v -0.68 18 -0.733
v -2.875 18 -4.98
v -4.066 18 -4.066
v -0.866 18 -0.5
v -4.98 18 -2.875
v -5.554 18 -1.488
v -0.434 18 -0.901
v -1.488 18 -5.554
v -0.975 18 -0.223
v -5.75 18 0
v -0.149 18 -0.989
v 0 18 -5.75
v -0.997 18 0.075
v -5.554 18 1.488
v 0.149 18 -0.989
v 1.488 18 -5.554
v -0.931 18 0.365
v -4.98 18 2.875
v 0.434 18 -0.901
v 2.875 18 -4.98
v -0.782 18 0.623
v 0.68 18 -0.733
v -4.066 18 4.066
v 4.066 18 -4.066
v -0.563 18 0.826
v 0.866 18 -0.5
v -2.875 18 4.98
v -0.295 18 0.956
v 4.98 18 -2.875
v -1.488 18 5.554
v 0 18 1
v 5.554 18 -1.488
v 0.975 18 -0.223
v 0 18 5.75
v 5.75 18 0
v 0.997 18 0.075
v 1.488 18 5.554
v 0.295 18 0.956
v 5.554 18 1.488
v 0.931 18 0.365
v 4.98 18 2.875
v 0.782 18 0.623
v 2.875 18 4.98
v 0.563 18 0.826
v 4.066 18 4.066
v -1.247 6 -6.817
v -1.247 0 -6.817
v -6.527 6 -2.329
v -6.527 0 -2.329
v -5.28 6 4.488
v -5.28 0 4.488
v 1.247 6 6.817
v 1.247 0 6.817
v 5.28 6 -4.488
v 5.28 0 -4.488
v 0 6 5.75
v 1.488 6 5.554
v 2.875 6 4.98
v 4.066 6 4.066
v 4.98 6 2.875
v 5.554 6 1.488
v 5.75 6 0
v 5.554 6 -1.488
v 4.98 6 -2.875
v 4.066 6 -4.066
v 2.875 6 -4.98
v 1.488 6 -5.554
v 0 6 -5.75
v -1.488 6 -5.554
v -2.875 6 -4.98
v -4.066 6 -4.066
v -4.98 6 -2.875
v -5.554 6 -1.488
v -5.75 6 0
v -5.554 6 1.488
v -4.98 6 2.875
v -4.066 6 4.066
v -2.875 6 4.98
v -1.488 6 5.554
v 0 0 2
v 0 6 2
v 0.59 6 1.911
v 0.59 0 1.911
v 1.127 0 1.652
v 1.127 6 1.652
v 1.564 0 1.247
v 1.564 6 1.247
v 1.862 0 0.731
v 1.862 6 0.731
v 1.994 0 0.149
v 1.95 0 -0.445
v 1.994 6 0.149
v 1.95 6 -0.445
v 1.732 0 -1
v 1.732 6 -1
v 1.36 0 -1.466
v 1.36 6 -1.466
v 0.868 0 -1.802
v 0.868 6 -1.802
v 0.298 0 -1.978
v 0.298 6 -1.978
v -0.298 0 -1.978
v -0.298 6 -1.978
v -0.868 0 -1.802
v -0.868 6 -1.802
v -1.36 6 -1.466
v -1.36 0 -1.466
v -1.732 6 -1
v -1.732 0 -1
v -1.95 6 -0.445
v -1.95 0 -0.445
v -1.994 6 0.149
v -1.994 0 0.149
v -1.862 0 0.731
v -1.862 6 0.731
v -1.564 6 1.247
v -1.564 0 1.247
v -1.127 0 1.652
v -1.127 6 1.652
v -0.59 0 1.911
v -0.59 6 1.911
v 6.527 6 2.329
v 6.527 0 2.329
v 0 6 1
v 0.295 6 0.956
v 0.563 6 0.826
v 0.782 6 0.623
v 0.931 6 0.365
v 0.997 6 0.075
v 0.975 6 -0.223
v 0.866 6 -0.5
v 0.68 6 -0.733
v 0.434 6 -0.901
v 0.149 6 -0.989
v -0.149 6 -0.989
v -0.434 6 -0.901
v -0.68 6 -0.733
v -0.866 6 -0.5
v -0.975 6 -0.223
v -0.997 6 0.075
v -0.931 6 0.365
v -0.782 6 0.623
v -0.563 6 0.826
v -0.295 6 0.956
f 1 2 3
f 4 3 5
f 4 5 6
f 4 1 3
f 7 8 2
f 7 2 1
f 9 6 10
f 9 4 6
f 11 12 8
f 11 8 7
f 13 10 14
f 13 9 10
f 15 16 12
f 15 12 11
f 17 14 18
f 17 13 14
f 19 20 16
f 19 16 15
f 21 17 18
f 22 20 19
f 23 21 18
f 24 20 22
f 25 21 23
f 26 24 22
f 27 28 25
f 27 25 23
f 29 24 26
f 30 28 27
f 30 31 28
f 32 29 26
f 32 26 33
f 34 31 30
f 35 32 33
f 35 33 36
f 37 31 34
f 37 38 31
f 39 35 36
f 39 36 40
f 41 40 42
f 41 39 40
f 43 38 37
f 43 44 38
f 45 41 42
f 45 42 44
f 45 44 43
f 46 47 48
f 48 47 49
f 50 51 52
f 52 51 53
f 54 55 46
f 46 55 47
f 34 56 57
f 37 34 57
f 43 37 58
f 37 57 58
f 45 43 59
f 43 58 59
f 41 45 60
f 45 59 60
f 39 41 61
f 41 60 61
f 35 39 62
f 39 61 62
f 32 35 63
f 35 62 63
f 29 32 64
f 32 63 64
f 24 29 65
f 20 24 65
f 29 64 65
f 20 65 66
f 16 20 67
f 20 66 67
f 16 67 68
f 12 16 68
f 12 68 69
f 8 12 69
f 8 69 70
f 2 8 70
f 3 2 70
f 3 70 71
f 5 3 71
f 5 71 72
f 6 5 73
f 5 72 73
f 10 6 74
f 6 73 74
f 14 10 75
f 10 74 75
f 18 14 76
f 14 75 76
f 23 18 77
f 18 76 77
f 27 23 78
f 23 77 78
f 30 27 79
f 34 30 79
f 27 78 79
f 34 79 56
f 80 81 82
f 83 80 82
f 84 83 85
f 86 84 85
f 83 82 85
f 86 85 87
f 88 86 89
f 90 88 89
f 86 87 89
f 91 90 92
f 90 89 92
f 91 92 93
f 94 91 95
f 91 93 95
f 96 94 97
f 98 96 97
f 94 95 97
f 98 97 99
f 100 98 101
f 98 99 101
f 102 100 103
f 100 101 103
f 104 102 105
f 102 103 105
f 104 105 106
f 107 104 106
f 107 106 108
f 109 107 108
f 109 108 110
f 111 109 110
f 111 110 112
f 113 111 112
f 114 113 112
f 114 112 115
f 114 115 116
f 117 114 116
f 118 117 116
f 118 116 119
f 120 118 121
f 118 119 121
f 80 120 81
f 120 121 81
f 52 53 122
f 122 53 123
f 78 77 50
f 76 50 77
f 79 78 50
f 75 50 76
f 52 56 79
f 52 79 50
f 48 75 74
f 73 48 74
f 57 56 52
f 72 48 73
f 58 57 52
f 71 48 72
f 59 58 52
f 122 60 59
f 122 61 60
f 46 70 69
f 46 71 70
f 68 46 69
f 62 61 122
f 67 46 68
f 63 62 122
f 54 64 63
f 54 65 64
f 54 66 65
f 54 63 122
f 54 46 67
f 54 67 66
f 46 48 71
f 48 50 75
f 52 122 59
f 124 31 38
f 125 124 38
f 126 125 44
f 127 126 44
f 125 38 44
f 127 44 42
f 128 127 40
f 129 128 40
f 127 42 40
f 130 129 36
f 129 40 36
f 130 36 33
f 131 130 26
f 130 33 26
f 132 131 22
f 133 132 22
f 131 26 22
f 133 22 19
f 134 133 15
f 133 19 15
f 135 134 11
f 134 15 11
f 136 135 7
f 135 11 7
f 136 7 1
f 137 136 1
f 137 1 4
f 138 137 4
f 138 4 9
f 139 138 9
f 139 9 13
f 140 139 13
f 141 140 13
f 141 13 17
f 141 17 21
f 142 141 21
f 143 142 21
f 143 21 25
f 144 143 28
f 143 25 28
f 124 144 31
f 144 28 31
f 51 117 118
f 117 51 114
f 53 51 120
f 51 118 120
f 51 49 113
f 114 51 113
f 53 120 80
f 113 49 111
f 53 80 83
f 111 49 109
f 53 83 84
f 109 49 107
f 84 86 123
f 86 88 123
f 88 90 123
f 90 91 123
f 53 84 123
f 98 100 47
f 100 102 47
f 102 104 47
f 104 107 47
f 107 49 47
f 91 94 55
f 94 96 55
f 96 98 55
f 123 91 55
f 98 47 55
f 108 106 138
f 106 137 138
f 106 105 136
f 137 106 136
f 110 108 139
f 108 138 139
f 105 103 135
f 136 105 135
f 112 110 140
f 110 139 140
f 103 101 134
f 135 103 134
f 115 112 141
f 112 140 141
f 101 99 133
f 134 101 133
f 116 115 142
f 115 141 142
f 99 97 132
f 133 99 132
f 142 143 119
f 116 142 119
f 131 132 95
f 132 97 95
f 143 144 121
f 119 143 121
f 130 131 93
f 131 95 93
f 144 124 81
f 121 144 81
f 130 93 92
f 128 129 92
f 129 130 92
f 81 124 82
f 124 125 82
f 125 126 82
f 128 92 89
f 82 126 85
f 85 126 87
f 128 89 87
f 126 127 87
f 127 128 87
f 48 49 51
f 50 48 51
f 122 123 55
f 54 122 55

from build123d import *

# Parameters (mm, degrees)
EXTRUDE_1_DEPTH     = 6
SKETCH_2_R          = 2
CUT_EXTRUDE_1_DEPTH = 6
SKETCH_3_R          = 5.75
EXTRUDE_2_DEPTH     = 12
SKETCH_4_R          = 1
CUT_EXTRUDE_2_DEPTH = 12


with BuildPart() as part:
    # 草图1 → 凸台-拉伸1 (new body)
    with BuildSketch(Plane(origin=(0, 0, 0), x_dir=(1, 0, 0), z_dir=(0, 1, 0))):
        Polygon((5.280239472, 4.488203551), (-1.246778557, 6.816923297), (-6.527018029, 2.328719745), (-5.280239472, -4.488203551), (1.246778557, -6.816923297), (6.527018029, -2.328719745), align=None)
    extrude(amount=EXTRUDE_1_DEPTH)

    # 草图2 → 切除-拉伸1 (cut)
    with BuildSketch(Plane(origin=(0, 6, 0), x_dir=(1, 0, 0), z_dir=(0, 1, 0))):
        with Locations(Location((0, 0, 0), (0, 0, 270))):
            Circle(SKETCH_2_R)
    extrude(amount=-CUT_EXTRUDE_1_DEPTH, mode=Mode.SUBTRACT)

    # 草图3 → 凸台-拉伸2 (add)
    with BuildSketch(Plane(origin=(0, 6, 0), x_dir=(1, 0, 0), z_dir=(0, 1, 0))):
        with Locations(Location((0, 0, 0), (0, 0, 270))):
            Circle(SKETCH_3_R)
    extrude(amount=EXTRUDE_2_DEPTH)

    # 草图4 → 切除-拉伸2 (cut)
    with BuildSketch(Plane(origin=(0, 18, 0), x_dir=(1, 0, 0), z_dir=(0, 1, 0))):
        with Locations(Location((0, 0, 0), (0, 0, 270))):
            Circle(SKETCH_4_R)
    extrude(amount=-CUT_EXTRUDE_2_DEPTH, mode=Mode.SUBTRACT)


solid = part.part
